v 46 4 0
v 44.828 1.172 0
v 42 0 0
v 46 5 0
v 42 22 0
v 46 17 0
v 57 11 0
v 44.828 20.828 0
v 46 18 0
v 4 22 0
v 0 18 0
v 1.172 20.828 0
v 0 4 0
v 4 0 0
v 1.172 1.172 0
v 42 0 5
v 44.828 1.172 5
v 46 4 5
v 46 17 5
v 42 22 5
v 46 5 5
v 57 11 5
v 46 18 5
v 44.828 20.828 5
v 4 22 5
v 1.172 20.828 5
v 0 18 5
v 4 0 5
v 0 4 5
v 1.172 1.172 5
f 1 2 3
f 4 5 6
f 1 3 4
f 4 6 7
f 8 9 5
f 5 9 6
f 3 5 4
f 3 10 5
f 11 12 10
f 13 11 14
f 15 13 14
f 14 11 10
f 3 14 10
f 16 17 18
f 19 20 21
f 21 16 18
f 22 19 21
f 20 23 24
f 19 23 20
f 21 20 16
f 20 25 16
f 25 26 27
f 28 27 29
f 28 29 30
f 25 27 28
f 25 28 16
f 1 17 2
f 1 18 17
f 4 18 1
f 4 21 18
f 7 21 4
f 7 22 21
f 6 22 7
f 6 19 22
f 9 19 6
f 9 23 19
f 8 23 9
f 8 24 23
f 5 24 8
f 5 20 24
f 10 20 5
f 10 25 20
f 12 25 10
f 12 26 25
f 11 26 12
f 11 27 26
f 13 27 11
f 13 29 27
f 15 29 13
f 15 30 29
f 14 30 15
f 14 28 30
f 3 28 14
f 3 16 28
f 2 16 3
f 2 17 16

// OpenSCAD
$fn = 32;

// ----------------------------------------------------------------------
// Ratchet pawl: 46 x 22 mm body, beak 11 mm с правого торца
// ----------------------------------------------------------------------

// --- parameters (mm) ---
profile_height = 5;       // extrusion height
profile_points = 15;      // points of the closed outline

profile = [[0, 4], [1.172, 1.172], [4, 0], [42, 0], [44.828, 1.172], [46, 4], [46, 5], [57, 11], [46, 17], [46, 18], [44.828, 20.828], [42, 22], [4, 22], [1.172, 20.828], [0, 18]];  // single closed polygon, 15 points, counter clockwise

// --- the one profile operation ---
linear_extrude(height = profile_height) polygon(points = profile);
